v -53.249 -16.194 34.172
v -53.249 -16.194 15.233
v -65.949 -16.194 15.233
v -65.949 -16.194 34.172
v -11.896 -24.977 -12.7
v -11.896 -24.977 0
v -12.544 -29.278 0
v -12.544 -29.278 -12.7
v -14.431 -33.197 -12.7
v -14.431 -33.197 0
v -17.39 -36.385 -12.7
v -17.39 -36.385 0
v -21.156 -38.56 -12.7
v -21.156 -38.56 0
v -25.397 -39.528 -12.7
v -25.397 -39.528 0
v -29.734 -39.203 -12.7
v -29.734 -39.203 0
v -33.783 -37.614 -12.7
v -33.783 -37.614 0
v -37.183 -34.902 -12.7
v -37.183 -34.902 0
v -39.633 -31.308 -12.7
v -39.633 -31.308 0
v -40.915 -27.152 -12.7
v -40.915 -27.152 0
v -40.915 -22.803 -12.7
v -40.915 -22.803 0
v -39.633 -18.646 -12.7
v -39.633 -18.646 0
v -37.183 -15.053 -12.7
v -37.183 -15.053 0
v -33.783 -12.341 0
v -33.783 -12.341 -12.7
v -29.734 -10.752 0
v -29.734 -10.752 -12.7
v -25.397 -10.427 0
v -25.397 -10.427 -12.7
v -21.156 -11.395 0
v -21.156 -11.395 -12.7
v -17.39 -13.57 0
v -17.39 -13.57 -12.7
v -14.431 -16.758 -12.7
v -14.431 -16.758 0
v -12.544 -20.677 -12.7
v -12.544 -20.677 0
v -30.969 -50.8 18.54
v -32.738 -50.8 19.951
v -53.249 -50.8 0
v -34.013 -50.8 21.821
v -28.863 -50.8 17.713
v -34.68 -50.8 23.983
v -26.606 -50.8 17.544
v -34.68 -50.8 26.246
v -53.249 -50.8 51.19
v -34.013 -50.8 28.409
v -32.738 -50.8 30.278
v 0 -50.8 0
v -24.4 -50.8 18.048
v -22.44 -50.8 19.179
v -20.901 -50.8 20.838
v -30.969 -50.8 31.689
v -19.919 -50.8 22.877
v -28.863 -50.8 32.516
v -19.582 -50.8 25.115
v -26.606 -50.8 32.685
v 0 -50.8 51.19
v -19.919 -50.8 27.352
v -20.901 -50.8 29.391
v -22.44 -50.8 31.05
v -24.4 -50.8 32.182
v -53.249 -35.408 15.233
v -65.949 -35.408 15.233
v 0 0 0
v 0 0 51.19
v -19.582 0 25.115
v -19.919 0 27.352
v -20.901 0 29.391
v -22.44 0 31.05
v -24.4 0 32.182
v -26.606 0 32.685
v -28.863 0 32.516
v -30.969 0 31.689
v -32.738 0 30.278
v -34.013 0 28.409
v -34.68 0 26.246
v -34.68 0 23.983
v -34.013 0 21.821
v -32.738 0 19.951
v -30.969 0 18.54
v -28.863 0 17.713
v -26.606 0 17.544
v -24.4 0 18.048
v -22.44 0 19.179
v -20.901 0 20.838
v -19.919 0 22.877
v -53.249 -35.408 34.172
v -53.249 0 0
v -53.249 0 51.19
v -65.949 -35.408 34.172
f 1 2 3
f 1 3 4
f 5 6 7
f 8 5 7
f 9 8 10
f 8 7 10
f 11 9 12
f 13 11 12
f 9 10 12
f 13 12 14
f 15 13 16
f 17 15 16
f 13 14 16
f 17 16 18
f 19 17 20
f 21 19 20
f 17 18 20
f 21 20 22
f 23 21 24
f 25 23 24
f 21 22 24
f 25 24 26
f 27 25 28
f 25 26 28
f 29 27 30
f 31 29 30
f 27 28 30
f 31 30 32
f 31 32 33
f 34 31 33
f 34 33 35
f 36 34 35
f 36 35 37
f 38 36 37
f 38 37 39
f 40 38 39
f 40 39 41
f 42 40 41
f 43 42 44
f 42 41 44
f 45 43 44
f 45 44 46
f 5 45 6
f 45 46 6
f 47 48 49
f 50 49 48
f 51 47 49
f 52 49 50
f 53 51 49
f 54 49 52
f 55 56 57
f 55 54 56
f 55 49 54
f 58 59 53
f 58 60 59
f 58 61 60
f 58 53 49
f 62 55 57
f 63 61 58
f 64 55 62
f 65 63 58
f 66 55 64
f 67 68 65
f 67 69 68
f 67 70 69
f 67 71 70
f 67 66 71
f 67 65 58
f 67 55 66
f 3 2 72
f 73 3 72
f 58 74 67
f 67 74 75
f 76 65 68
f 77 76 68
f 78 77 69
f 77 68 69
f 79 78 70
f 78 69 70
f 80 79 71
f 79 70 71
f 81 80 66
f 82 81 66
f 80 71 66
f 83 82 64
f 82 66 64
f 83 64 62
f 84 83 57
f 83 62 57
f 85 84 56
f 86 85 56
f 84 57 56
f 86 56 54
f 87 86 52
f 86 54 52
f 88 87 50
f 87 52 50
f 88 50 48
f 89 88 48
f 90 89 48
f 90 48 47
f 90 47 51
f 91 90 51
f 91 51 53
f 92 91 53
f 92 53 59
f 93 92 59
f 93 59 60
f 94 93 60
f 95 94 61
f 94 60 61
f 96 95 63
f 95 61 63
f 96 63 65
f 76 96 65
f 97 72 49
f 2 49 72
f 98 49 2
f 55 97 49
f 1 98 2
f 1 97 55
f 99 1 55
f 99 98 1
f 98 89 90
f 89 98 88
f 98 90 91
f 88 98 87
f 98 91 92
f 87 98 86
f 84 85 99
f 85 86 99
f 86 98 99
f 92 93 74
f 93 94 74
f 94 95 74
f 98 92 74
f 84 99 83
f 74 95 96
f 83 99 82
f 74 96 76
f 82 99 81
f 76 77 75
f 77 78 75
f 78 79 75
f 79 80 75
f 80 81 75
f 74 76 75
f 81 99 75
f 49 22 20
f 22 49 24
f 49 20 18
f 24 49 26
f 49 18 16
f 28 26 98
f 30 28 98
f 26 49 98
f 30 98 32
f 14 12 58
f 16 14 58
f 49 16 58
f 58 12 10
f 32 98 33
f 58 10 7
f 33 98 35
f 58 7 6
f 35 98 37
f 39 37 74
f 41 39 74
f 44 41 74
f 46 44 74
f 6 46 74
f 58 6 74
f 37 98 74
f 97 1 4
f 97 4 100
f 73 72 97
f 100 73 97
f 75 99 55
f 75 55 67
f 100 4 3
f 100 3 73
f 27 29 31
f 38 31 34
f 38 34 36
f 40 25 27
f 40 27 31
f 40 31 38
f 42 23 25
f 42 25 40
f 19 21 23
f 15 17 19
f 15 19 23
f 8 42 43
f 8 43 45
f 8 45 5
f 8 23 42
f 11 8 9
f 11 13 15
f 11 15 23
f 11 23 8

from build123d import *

# Parameters (mm, degrees)
F0_W     = 53.24851
F0_H     = 51.189933
F1_DEPTH = 50.8
F2_R     = 7.591655
F3_DEPTH = 50.8
F4_W     = 19.213377
F4_H     = 18.938902
F5_DEPTH = 12.7
F6_R     = 14.591229
F7_DEPTH = 12.7


with BuildPart() as f1:
    # F0 (on Front) → F1 (new body)
    with BuildSketch(Plane.XZ):
        with Locations((-26.624255, 25.594966)):
            Rectangle(F0_W, F0_H)
    extrude(amount=F1_DEPTH)

    # F2 (on face) → F3 (cut)
    with BuildSketch(Plane.XZ.offset(50.8)):
        with Locations((-27.173208, 25.114631)):
            Circle(F2_R)
    extrude(amount=-F3_DEPTH, mode=Mode.SUBTRACT)

    # F4 (on face) → F5 (join)
    with BuildSketch(Plane(origin=(-53.24851, 0, 0), x_dir=(0, -1, 0), z_dir=(-1, 0, 0))):
        with Locations((25.800821, 24.702916)):
            Rectangle(F4_W, F4_H)
    extrude(amount=F5_DEPTH)

    # F6 (on face) → F7 (join)
    with BuildSketch(Plane(origin=(0, 0, 0), x_dir=(1, 0, 0), z_dir=(0, 0, -1))):
        with Locations((-26.487015, 24.977392)):
            Circle(F6_R)
    extrude(amount=F7_DEPTH)


solid = f1.part
